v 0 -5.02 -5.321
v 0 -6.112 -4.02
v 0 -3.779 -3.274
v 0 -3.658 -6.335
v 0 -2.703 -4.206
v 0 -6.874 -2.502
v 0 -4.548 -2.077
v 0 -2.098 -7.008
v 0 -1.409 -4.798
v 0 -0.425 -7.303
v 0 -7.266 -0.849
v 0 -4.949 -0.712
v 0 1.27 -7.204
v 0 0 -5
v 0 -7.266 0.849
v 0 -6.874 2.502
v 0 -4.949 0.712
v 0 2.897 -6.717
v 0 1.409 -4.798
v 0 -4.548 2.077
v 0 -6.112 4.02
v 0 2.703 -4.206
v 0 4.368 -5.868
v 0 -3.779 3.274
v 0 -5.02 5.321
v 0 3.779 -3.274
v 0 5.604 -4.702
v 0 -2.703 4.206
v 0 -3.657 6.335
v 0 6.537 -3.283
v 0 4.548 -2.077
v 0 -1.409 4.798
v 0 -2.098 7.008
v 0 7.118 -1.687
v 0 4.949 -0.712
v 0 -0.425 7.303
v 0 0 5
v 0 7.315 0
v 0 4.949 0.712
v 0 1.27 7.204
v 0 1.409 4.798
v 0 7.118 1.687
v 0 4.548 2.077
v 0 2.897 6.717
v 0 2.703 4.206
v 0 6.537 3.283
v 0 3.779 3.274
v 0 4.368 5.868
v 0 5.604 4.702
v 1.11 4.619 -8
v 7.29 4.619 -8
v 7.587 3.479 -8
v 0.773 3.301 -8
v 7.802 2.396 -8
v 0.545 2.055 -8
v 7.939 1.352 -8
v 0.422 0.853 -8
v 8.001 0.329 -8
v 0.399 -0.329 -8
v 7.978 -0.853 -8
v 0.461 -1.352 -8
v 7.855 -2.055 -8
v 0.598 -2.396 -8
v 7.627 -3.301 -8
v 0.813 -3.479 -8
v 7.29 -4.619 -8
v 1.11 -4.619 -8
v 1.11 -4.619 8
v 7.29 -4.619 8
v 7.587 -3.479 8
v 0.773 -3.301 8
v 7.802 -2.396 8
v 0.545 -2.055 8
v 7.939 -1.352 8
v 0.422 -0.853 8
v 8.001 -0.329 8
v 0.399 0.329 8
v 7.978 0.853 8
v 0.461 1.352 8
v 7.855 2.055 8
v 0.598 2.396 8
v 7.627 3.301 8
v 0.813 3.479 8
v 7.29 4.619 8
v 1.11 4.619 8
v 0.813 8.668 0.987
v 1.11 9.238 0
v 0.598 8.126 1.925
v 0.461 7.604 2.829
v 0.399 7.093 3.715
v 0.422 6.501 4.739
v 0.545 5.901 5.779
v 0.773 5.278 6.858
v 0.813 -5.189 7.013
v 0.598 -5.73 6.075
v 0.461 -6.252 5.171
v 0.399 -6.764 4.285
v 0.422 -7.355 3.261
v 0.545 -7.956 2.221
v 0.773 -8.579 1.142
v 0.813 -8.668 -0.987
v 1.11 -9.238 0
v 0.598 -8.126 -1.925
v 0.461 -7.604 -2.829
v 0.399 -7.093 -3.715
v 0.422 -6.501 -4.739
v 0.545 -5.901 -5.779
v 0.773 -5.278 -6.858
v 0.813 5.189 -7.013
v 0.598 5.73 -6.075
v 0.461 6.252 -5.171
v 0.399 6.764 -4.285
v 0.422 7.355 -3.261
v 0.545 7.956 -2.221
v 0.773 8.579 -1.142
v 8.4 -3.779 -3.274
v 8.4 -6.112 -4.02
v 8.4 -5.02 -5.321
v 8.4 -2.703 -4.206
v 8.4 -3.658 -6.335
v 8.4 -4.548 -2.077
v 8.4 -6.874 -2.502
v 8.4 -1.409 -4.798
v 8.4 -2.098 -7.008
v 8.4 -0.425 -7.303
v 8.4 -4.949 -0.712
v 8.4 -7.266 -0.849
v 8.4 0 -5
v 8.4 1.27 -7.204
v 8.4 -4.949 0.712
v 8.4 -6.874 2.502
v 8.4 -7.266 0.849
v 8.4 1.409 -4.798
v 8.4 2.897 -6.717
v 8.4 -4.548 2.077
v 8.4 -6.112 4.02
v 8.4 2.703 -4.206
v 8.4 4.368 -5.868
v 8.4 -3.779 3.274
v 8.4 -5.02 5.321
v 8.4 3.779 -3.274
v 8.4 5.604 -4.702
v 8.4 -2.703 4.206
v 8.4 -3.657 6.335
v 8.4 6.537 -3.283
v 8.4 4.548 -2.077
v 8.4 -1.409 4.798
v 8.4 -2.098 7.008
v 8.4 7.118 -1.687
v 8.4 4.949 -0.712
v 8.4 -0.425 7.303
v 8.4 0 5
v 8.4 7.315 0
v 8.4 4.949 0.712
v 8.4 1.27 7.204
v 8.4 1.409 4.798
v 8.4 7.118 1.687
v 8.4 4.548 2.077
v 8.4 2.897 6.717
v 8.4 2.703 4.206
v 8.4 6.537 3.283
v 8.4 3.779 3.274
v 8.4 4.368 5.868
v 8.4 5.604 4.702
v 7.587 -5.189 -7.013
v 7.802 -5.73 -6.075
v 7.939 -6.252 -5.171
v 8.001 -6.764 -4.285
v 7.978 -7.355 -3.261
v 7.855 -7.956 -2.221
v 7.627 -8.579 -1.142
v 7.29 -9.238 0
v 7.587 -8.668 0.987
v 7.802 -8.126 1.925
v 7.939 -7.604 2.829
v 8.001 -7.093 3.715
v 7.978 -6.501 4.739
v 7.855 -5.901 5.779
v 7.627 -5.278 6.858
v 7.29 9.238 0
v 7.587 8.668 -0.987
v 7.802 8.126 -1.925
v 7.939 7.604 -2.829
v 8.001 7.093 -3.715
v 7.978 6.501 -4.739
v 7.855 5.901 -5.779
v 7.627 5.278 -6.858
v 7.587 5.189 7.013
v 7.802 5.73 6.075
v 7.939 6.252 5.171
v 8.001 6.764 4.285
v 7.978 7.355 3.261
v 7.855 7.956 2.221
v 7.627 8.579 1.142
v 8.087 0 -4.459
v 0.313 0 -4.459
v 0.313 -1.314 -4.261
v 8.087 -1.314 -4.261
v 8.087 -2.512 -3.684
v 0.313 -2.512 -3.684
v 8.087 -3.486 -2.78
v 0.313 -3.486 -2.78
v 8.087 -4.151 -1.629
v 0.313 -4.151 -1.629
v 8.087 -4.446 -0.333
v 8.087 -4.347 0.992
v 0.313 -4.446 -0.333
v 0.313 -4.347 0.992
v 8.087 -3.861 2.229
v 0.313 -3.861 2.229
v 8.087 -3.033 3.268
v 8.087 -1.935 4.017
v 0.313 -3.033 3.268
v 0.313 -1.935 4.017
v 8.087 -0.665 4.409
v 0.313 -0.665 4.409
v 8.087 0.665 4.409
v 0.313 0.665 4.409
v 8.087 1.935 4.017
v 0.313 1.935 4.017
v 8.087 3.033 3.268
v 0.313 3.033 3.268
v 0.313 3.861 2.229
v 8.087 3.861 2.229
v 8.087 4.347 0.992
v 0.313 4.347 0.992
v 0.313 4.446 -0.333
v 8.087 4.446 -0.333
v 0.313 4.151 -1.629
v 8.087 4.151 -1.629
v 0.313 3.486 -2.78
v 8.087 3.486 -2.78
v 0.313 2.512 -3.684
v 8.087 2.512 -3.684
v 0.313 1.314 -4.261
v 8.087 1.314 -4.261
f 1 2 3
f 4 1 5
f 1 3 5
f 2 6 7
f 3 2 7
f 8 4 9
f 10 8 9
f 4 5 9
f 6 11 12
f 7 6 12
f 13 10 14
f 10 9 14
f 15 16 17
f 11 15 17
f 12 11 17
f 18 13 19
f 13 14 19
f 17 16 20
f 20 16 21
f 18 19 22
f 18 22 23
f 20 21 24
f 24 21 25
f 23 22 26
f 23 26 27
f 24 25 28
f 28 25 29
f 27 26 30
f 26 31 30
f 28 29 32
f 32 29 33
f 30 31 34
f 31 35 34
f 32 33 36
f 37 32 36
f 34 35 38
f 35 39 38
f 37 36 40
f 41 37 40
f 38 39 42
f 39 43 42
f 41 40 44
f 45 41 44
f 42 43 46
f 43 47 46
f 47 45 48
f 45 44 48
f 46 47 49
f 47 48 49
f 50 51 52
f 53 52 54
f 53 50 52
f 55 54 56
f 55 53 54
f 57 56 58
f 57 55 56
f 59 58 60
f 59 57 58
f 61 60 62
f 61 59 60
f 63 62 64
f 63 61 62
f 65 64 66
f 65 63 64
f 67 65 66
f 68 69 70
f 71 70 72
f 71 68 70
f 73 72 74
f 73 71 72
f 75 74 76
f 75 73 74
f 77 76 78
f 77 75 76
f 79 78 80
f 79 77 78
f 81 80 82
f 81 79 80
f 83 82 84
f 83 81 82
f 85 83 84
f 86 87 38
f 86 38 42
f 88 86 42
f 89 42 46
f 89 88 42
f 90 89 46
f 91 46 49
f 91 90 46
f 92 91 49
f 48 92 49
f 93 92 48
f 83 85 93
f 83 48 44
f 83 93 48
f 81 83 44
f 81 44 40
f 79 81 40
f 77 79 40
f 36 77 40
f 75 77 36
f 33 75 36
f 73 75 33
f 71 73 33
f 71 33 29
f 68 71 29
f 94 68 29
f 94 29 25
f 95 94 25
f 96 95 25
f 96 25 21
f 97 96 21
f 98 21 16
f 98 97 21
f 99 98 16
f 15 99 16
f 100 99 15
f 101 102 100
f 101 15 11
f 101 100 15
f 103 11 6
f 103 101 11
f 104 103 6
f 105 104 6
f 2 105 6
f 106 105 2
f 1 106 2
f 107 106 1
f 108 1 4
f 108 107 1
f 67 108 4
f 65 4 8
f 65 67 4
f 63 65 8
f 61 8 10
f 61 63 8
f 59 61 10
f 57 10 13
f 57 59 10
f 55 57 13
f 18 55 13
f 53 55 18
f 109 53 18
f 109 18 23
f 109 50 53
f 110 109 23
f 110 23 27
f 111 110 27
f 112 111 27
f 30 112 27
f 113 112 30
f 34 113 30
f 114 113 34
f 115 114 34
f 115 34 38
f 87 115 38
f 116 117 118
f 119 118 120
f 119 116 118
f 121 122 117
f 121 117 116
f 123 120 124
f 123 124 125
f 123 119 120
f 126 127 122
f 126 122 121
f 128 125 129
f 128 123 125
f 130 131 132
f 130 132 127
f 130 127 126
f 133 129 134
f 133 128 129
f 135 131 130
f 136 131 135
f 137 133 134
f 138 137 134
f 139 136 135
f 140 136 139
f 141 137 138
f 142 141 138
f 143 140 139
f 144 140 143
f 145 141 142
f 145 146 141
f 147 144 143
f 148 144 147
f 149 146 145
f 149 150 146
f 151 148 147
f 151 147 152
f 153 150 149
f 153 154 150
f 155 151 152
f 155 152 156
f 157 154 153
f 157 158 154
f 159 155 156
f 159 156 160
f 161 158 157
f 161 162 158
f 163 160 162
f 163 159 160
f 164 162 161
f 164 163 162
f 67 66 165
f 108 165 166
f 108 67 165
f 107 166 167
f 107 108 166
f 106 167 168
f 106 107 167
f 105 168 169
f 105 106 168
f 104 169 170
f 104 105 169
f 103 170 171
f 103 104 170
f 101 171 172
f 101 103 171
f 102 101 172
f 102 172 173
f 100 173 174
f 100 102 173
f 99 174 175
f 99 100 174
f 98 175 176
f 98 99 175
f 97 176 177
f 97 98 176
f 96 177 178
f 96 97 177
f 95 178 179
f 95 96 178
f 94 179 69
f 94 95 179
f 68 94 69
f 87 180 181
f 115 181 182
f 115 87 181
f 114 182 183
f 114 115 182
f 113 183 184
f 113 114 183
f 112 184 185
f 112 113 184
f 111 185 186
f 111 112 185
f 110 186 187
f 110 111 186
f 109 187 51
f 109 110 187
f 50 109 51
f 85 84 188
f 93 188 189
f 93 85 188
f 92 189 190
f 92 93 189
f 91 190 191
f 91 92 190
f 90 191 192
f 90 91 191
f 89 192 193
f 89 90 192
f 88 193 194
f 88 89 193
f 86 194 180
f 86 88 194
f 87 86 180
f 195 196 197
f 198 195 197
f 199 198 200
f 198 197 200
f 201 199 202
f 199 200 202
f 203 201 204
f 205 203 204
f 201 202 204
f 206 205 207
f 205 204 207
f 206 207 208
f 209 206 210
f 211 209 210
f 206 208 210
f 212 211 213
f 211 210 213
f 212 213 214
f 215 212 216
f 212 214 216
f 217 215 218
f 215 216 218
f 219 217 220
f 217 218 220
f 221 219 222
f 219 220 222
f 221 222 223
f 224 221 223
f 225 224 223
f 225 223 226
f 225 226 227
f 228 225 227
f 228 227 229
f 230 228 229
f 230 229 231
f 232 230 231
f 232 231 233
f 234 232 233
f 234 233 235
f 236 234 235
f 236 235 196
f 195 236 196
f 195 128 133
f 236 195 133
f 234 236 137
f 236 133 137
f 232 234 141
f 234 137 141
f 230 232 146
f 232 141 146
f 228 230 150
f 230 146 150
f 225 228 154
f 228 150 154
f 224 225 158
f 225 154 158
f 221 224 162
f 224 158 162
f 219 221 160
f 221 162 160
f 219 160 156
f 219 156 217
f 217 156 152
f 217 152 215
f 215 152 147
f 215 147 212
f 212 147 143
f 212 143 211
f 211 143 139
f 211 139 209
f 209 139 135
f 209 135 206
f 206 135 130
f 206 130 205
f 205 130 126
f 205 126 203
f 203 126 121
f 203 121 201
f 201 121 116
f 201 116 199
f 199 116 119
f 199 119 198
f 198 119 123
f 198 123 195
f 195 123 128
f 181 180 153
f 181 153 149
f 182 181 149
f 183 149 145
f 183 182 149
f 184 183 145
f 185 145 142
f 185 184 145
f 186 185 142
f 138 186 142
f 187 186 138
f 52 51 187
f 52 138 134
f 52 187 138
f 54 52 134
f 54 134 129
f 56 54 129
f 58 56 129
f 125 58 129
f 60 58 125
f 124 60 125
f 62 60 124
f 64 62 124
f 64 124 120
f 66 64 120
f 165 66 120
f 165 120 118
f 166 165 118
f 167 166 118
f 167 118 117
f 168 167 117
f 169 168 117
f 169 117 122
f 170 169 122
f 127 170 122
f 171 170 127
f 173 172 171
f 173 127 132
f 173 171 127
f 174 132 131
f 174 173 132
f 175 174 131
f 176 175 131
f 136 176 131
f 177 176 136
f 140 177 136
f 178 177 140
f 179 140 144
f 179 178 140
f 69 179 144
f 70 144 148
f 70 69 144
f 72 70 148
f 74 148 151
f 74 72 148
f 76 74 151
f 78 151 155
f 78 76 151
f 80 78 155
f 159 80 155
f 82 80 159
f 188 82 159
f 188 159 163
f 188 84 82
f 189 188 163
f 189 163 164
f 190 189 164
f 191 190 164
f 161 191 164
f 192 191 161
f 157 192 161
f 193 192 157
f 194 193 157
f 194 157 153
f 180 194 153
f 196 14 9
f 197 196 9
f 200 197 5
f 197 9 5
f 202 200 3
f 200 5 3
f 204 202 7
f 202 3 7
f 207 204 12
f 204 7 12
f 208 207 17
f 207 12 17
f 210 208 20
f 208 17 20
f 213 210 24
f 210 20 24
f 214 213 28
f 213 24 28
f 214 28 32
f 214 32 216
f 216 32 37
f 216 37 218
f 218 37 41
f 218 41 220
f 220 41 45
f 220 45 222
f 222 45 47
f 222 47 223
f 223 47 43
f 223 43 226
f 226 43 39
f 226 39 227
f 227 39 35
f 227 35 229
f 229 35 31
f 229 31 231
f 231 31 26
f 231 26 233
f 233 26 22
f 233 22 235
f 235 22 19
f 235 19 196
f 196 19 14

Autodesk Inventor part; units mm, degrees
ref_plane "YZ Plane" through (0, 0, 0) normal (1, 0, 0) x (0, 1, 0)
ref_plane "XZ Plane" through (0, 0, 0) normal (0, 1, 0) x (-1, 0, 0)
sketch "Эскиз1" plane through (0, 0, 0) normal (1, 0, 0) x (0, 1, 0)
  line L0 (-9.2376, 0) -> (-4.6188, 8)
  line L1 (-4.6188, 8) -> (4.6188, 8)
  line L2 (4.6188, 8) -> (9.2376, 0)
  line L3 (9.2376, 0) -> (4.6188, -8)
  line L4 (4.6188, -8) -> (-4.6188, -8)
  line L5 (-4.6188, -8) -> (-9.2376, 0)
  point P0 (0, 0)
  point P1 (0, 0)
  dimension "d0" = 18.4752
extrude "Базовый элемент" add sketch "Эскиз1" along normal blind 8.4
sketch "Эскиз2" plane through (0, 0, 0) normal (0, 0, 1) x (1, 0, 0)
  line L0 (0, 4.6188) -> (0, 9.2376) projected
  line L1 (0, 9.2376) -> (8.4, 9.2376) projected
  line L2 (8.4, 4.6188) -> (8.4, 9.2376) projected
  line L3 (-1.68, 0) -> (10.08, 0) projected
  line L4 (1.11, 9.2376) -> (0, 7.315)
  line L5 (7.29, 9.2376) -> (8.4, 7.315)
  dimension "d3" = 30
  dimension "d4" = 30
  dimension "d5" = 14.63
  dimension "d6" = 14.63
revolve "Фаска1" cut sketch "Эскиз2" angle 360 about axis through (-10, 0, 0) along (1, 0, 0)
sketch "Эскиз3" plane through (8.4, 0, 0) normal (1, 0, 0) x (0, 0, -1)
  arc A0 (-0.625, -1.0825) -> (0.625, -1.0825) centre (0, 0) ccw projected
hole "Резьба" at (8.4, 0, 0) direction (-1, 0, 0) diameter 8.9175 end through all thread size "M10x1" class "6H" standard "ISO Metric profile"
chamfer "Фаска2" distance 0.5413 angle 30 1 edges at (8.4, 0, 4.4587) measured on face at (8.4, 6.2812, -0.7627)
chamfer "Фаска3" distance 0.5413 angle 30 1 edges at (0, 0, 4.4587) measured on face at (0, 6.2812, -0.7627)
ref_plane "Work Plane1" through (-17.5922, 0, 0) normal (0, -0.866, -0.5) x (1, 0, 0)
equation "\"d0\" = 1.1547 * SW"
equation "\"d1\" = KOH"
equation "\"d3\" = ANG1"
equation "\"d4\" = ANG2"
equation "\"d5\" = SW0"
equation "\"d6\" = SW01"
equation "\"d8\" = -0.5 * GD1 + 0.5 * NND"
equation "\"d40\" = -0.5 * GD1 + 0.5 * NND"
equation "\"d10\" = -0.5 * GD1 + 0.5 * NND"
equation "\"d41\" = -0.5 * GD1 + 0.5 * NND"
equation "\"ANG1\" = 30deg"
equation "\"ANG2\" = 30deg"
equation "\"KOH\" = 8.4"
equation "\"SW\" = 16"
equation "\"SW0\" = 14.63"
equation "\"SW01\" = SW0"
equation "\"GUL\" = 0.541266 * PTC"
equation "\"LADI\" = 12.345"
equation "\"TOA\" = 30deg"
equation "\"FAWI\" = 30deg"
equation "\"PTC\" = 1"
equation "\"E0\" = 1.155 * SW"
equation "\"GAL\" = 0.541266 * PTC"
equation "\"GD1\" = 8.917468"
equation "\"NND\" = 10"
properties part number "Копия гайки M10x1-6H ГОСТ 5915-70" material "Сталь, мягкая"
